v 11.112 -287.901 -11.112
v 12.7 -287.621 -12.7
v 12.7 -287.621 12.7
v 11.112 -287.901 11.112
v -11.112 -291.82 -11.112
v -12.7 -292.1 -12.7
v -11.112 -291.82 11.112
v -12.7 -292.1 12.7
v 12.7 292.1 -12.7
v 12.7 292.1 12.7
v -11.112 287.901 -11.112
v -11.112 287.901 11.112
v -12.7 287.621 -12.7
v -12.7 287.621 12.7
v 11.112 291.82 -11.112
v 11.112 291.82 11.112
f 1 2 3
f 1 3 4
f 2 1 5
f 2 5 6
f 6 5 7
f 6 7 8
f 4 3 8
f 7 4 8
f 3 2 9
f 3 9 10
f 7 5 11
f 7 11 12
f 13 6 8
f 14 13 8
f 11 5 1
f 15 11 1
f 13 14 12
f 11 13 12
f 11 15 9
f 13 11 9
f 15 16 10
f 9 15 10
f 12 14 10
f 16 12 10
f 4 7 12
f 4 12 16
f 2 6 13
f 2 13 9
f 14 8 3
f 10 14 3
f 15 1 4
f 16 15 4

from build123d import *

# Parameters (mm, degrees)
F0_W     = 25.4
F0_H     = 25.4
F0_W_2   = 22.225
F0_H_2   = 22.225
F1_DEPTH = 292.1
F3_DEPTH = 25.401
F5_DEPTH = 25.401


with BuildPart() as f1:
    # F0 (on Front) → F1 (new body, symmetric)
    with BuildSketch(Plane.XZ):
        Rectangle(F0_W, F0_H)
        Rectangle(F0_W_2, F0_H_2, mode=Mode.SUBTRACT)
    extrude(amount=F1_DEPTH, both=True)

    # F2 (on face) → F3 (cut, through all)
    with BuildSketch(Plane.XY.offset(12.7)):
        Polygon((12.7, 292.1), (-12.7, 292.1), (-12.7, 287.621295), align=None)
    extrude(amount=-F3_DEPTH, mode=Mode.SUBTRACT)

    # F4 (on face) → F5 (cut, through all)
    with BuildSketch(Plane.XY.offset(12.7)):
        Polygon((12.7, -287.621295), (-12.7, -292.1), (12.7, -292.1), align=None)
    extrude(amount=-F5_DEPTH, mode=Mode.SUBTRACT)


solid = f1.part
